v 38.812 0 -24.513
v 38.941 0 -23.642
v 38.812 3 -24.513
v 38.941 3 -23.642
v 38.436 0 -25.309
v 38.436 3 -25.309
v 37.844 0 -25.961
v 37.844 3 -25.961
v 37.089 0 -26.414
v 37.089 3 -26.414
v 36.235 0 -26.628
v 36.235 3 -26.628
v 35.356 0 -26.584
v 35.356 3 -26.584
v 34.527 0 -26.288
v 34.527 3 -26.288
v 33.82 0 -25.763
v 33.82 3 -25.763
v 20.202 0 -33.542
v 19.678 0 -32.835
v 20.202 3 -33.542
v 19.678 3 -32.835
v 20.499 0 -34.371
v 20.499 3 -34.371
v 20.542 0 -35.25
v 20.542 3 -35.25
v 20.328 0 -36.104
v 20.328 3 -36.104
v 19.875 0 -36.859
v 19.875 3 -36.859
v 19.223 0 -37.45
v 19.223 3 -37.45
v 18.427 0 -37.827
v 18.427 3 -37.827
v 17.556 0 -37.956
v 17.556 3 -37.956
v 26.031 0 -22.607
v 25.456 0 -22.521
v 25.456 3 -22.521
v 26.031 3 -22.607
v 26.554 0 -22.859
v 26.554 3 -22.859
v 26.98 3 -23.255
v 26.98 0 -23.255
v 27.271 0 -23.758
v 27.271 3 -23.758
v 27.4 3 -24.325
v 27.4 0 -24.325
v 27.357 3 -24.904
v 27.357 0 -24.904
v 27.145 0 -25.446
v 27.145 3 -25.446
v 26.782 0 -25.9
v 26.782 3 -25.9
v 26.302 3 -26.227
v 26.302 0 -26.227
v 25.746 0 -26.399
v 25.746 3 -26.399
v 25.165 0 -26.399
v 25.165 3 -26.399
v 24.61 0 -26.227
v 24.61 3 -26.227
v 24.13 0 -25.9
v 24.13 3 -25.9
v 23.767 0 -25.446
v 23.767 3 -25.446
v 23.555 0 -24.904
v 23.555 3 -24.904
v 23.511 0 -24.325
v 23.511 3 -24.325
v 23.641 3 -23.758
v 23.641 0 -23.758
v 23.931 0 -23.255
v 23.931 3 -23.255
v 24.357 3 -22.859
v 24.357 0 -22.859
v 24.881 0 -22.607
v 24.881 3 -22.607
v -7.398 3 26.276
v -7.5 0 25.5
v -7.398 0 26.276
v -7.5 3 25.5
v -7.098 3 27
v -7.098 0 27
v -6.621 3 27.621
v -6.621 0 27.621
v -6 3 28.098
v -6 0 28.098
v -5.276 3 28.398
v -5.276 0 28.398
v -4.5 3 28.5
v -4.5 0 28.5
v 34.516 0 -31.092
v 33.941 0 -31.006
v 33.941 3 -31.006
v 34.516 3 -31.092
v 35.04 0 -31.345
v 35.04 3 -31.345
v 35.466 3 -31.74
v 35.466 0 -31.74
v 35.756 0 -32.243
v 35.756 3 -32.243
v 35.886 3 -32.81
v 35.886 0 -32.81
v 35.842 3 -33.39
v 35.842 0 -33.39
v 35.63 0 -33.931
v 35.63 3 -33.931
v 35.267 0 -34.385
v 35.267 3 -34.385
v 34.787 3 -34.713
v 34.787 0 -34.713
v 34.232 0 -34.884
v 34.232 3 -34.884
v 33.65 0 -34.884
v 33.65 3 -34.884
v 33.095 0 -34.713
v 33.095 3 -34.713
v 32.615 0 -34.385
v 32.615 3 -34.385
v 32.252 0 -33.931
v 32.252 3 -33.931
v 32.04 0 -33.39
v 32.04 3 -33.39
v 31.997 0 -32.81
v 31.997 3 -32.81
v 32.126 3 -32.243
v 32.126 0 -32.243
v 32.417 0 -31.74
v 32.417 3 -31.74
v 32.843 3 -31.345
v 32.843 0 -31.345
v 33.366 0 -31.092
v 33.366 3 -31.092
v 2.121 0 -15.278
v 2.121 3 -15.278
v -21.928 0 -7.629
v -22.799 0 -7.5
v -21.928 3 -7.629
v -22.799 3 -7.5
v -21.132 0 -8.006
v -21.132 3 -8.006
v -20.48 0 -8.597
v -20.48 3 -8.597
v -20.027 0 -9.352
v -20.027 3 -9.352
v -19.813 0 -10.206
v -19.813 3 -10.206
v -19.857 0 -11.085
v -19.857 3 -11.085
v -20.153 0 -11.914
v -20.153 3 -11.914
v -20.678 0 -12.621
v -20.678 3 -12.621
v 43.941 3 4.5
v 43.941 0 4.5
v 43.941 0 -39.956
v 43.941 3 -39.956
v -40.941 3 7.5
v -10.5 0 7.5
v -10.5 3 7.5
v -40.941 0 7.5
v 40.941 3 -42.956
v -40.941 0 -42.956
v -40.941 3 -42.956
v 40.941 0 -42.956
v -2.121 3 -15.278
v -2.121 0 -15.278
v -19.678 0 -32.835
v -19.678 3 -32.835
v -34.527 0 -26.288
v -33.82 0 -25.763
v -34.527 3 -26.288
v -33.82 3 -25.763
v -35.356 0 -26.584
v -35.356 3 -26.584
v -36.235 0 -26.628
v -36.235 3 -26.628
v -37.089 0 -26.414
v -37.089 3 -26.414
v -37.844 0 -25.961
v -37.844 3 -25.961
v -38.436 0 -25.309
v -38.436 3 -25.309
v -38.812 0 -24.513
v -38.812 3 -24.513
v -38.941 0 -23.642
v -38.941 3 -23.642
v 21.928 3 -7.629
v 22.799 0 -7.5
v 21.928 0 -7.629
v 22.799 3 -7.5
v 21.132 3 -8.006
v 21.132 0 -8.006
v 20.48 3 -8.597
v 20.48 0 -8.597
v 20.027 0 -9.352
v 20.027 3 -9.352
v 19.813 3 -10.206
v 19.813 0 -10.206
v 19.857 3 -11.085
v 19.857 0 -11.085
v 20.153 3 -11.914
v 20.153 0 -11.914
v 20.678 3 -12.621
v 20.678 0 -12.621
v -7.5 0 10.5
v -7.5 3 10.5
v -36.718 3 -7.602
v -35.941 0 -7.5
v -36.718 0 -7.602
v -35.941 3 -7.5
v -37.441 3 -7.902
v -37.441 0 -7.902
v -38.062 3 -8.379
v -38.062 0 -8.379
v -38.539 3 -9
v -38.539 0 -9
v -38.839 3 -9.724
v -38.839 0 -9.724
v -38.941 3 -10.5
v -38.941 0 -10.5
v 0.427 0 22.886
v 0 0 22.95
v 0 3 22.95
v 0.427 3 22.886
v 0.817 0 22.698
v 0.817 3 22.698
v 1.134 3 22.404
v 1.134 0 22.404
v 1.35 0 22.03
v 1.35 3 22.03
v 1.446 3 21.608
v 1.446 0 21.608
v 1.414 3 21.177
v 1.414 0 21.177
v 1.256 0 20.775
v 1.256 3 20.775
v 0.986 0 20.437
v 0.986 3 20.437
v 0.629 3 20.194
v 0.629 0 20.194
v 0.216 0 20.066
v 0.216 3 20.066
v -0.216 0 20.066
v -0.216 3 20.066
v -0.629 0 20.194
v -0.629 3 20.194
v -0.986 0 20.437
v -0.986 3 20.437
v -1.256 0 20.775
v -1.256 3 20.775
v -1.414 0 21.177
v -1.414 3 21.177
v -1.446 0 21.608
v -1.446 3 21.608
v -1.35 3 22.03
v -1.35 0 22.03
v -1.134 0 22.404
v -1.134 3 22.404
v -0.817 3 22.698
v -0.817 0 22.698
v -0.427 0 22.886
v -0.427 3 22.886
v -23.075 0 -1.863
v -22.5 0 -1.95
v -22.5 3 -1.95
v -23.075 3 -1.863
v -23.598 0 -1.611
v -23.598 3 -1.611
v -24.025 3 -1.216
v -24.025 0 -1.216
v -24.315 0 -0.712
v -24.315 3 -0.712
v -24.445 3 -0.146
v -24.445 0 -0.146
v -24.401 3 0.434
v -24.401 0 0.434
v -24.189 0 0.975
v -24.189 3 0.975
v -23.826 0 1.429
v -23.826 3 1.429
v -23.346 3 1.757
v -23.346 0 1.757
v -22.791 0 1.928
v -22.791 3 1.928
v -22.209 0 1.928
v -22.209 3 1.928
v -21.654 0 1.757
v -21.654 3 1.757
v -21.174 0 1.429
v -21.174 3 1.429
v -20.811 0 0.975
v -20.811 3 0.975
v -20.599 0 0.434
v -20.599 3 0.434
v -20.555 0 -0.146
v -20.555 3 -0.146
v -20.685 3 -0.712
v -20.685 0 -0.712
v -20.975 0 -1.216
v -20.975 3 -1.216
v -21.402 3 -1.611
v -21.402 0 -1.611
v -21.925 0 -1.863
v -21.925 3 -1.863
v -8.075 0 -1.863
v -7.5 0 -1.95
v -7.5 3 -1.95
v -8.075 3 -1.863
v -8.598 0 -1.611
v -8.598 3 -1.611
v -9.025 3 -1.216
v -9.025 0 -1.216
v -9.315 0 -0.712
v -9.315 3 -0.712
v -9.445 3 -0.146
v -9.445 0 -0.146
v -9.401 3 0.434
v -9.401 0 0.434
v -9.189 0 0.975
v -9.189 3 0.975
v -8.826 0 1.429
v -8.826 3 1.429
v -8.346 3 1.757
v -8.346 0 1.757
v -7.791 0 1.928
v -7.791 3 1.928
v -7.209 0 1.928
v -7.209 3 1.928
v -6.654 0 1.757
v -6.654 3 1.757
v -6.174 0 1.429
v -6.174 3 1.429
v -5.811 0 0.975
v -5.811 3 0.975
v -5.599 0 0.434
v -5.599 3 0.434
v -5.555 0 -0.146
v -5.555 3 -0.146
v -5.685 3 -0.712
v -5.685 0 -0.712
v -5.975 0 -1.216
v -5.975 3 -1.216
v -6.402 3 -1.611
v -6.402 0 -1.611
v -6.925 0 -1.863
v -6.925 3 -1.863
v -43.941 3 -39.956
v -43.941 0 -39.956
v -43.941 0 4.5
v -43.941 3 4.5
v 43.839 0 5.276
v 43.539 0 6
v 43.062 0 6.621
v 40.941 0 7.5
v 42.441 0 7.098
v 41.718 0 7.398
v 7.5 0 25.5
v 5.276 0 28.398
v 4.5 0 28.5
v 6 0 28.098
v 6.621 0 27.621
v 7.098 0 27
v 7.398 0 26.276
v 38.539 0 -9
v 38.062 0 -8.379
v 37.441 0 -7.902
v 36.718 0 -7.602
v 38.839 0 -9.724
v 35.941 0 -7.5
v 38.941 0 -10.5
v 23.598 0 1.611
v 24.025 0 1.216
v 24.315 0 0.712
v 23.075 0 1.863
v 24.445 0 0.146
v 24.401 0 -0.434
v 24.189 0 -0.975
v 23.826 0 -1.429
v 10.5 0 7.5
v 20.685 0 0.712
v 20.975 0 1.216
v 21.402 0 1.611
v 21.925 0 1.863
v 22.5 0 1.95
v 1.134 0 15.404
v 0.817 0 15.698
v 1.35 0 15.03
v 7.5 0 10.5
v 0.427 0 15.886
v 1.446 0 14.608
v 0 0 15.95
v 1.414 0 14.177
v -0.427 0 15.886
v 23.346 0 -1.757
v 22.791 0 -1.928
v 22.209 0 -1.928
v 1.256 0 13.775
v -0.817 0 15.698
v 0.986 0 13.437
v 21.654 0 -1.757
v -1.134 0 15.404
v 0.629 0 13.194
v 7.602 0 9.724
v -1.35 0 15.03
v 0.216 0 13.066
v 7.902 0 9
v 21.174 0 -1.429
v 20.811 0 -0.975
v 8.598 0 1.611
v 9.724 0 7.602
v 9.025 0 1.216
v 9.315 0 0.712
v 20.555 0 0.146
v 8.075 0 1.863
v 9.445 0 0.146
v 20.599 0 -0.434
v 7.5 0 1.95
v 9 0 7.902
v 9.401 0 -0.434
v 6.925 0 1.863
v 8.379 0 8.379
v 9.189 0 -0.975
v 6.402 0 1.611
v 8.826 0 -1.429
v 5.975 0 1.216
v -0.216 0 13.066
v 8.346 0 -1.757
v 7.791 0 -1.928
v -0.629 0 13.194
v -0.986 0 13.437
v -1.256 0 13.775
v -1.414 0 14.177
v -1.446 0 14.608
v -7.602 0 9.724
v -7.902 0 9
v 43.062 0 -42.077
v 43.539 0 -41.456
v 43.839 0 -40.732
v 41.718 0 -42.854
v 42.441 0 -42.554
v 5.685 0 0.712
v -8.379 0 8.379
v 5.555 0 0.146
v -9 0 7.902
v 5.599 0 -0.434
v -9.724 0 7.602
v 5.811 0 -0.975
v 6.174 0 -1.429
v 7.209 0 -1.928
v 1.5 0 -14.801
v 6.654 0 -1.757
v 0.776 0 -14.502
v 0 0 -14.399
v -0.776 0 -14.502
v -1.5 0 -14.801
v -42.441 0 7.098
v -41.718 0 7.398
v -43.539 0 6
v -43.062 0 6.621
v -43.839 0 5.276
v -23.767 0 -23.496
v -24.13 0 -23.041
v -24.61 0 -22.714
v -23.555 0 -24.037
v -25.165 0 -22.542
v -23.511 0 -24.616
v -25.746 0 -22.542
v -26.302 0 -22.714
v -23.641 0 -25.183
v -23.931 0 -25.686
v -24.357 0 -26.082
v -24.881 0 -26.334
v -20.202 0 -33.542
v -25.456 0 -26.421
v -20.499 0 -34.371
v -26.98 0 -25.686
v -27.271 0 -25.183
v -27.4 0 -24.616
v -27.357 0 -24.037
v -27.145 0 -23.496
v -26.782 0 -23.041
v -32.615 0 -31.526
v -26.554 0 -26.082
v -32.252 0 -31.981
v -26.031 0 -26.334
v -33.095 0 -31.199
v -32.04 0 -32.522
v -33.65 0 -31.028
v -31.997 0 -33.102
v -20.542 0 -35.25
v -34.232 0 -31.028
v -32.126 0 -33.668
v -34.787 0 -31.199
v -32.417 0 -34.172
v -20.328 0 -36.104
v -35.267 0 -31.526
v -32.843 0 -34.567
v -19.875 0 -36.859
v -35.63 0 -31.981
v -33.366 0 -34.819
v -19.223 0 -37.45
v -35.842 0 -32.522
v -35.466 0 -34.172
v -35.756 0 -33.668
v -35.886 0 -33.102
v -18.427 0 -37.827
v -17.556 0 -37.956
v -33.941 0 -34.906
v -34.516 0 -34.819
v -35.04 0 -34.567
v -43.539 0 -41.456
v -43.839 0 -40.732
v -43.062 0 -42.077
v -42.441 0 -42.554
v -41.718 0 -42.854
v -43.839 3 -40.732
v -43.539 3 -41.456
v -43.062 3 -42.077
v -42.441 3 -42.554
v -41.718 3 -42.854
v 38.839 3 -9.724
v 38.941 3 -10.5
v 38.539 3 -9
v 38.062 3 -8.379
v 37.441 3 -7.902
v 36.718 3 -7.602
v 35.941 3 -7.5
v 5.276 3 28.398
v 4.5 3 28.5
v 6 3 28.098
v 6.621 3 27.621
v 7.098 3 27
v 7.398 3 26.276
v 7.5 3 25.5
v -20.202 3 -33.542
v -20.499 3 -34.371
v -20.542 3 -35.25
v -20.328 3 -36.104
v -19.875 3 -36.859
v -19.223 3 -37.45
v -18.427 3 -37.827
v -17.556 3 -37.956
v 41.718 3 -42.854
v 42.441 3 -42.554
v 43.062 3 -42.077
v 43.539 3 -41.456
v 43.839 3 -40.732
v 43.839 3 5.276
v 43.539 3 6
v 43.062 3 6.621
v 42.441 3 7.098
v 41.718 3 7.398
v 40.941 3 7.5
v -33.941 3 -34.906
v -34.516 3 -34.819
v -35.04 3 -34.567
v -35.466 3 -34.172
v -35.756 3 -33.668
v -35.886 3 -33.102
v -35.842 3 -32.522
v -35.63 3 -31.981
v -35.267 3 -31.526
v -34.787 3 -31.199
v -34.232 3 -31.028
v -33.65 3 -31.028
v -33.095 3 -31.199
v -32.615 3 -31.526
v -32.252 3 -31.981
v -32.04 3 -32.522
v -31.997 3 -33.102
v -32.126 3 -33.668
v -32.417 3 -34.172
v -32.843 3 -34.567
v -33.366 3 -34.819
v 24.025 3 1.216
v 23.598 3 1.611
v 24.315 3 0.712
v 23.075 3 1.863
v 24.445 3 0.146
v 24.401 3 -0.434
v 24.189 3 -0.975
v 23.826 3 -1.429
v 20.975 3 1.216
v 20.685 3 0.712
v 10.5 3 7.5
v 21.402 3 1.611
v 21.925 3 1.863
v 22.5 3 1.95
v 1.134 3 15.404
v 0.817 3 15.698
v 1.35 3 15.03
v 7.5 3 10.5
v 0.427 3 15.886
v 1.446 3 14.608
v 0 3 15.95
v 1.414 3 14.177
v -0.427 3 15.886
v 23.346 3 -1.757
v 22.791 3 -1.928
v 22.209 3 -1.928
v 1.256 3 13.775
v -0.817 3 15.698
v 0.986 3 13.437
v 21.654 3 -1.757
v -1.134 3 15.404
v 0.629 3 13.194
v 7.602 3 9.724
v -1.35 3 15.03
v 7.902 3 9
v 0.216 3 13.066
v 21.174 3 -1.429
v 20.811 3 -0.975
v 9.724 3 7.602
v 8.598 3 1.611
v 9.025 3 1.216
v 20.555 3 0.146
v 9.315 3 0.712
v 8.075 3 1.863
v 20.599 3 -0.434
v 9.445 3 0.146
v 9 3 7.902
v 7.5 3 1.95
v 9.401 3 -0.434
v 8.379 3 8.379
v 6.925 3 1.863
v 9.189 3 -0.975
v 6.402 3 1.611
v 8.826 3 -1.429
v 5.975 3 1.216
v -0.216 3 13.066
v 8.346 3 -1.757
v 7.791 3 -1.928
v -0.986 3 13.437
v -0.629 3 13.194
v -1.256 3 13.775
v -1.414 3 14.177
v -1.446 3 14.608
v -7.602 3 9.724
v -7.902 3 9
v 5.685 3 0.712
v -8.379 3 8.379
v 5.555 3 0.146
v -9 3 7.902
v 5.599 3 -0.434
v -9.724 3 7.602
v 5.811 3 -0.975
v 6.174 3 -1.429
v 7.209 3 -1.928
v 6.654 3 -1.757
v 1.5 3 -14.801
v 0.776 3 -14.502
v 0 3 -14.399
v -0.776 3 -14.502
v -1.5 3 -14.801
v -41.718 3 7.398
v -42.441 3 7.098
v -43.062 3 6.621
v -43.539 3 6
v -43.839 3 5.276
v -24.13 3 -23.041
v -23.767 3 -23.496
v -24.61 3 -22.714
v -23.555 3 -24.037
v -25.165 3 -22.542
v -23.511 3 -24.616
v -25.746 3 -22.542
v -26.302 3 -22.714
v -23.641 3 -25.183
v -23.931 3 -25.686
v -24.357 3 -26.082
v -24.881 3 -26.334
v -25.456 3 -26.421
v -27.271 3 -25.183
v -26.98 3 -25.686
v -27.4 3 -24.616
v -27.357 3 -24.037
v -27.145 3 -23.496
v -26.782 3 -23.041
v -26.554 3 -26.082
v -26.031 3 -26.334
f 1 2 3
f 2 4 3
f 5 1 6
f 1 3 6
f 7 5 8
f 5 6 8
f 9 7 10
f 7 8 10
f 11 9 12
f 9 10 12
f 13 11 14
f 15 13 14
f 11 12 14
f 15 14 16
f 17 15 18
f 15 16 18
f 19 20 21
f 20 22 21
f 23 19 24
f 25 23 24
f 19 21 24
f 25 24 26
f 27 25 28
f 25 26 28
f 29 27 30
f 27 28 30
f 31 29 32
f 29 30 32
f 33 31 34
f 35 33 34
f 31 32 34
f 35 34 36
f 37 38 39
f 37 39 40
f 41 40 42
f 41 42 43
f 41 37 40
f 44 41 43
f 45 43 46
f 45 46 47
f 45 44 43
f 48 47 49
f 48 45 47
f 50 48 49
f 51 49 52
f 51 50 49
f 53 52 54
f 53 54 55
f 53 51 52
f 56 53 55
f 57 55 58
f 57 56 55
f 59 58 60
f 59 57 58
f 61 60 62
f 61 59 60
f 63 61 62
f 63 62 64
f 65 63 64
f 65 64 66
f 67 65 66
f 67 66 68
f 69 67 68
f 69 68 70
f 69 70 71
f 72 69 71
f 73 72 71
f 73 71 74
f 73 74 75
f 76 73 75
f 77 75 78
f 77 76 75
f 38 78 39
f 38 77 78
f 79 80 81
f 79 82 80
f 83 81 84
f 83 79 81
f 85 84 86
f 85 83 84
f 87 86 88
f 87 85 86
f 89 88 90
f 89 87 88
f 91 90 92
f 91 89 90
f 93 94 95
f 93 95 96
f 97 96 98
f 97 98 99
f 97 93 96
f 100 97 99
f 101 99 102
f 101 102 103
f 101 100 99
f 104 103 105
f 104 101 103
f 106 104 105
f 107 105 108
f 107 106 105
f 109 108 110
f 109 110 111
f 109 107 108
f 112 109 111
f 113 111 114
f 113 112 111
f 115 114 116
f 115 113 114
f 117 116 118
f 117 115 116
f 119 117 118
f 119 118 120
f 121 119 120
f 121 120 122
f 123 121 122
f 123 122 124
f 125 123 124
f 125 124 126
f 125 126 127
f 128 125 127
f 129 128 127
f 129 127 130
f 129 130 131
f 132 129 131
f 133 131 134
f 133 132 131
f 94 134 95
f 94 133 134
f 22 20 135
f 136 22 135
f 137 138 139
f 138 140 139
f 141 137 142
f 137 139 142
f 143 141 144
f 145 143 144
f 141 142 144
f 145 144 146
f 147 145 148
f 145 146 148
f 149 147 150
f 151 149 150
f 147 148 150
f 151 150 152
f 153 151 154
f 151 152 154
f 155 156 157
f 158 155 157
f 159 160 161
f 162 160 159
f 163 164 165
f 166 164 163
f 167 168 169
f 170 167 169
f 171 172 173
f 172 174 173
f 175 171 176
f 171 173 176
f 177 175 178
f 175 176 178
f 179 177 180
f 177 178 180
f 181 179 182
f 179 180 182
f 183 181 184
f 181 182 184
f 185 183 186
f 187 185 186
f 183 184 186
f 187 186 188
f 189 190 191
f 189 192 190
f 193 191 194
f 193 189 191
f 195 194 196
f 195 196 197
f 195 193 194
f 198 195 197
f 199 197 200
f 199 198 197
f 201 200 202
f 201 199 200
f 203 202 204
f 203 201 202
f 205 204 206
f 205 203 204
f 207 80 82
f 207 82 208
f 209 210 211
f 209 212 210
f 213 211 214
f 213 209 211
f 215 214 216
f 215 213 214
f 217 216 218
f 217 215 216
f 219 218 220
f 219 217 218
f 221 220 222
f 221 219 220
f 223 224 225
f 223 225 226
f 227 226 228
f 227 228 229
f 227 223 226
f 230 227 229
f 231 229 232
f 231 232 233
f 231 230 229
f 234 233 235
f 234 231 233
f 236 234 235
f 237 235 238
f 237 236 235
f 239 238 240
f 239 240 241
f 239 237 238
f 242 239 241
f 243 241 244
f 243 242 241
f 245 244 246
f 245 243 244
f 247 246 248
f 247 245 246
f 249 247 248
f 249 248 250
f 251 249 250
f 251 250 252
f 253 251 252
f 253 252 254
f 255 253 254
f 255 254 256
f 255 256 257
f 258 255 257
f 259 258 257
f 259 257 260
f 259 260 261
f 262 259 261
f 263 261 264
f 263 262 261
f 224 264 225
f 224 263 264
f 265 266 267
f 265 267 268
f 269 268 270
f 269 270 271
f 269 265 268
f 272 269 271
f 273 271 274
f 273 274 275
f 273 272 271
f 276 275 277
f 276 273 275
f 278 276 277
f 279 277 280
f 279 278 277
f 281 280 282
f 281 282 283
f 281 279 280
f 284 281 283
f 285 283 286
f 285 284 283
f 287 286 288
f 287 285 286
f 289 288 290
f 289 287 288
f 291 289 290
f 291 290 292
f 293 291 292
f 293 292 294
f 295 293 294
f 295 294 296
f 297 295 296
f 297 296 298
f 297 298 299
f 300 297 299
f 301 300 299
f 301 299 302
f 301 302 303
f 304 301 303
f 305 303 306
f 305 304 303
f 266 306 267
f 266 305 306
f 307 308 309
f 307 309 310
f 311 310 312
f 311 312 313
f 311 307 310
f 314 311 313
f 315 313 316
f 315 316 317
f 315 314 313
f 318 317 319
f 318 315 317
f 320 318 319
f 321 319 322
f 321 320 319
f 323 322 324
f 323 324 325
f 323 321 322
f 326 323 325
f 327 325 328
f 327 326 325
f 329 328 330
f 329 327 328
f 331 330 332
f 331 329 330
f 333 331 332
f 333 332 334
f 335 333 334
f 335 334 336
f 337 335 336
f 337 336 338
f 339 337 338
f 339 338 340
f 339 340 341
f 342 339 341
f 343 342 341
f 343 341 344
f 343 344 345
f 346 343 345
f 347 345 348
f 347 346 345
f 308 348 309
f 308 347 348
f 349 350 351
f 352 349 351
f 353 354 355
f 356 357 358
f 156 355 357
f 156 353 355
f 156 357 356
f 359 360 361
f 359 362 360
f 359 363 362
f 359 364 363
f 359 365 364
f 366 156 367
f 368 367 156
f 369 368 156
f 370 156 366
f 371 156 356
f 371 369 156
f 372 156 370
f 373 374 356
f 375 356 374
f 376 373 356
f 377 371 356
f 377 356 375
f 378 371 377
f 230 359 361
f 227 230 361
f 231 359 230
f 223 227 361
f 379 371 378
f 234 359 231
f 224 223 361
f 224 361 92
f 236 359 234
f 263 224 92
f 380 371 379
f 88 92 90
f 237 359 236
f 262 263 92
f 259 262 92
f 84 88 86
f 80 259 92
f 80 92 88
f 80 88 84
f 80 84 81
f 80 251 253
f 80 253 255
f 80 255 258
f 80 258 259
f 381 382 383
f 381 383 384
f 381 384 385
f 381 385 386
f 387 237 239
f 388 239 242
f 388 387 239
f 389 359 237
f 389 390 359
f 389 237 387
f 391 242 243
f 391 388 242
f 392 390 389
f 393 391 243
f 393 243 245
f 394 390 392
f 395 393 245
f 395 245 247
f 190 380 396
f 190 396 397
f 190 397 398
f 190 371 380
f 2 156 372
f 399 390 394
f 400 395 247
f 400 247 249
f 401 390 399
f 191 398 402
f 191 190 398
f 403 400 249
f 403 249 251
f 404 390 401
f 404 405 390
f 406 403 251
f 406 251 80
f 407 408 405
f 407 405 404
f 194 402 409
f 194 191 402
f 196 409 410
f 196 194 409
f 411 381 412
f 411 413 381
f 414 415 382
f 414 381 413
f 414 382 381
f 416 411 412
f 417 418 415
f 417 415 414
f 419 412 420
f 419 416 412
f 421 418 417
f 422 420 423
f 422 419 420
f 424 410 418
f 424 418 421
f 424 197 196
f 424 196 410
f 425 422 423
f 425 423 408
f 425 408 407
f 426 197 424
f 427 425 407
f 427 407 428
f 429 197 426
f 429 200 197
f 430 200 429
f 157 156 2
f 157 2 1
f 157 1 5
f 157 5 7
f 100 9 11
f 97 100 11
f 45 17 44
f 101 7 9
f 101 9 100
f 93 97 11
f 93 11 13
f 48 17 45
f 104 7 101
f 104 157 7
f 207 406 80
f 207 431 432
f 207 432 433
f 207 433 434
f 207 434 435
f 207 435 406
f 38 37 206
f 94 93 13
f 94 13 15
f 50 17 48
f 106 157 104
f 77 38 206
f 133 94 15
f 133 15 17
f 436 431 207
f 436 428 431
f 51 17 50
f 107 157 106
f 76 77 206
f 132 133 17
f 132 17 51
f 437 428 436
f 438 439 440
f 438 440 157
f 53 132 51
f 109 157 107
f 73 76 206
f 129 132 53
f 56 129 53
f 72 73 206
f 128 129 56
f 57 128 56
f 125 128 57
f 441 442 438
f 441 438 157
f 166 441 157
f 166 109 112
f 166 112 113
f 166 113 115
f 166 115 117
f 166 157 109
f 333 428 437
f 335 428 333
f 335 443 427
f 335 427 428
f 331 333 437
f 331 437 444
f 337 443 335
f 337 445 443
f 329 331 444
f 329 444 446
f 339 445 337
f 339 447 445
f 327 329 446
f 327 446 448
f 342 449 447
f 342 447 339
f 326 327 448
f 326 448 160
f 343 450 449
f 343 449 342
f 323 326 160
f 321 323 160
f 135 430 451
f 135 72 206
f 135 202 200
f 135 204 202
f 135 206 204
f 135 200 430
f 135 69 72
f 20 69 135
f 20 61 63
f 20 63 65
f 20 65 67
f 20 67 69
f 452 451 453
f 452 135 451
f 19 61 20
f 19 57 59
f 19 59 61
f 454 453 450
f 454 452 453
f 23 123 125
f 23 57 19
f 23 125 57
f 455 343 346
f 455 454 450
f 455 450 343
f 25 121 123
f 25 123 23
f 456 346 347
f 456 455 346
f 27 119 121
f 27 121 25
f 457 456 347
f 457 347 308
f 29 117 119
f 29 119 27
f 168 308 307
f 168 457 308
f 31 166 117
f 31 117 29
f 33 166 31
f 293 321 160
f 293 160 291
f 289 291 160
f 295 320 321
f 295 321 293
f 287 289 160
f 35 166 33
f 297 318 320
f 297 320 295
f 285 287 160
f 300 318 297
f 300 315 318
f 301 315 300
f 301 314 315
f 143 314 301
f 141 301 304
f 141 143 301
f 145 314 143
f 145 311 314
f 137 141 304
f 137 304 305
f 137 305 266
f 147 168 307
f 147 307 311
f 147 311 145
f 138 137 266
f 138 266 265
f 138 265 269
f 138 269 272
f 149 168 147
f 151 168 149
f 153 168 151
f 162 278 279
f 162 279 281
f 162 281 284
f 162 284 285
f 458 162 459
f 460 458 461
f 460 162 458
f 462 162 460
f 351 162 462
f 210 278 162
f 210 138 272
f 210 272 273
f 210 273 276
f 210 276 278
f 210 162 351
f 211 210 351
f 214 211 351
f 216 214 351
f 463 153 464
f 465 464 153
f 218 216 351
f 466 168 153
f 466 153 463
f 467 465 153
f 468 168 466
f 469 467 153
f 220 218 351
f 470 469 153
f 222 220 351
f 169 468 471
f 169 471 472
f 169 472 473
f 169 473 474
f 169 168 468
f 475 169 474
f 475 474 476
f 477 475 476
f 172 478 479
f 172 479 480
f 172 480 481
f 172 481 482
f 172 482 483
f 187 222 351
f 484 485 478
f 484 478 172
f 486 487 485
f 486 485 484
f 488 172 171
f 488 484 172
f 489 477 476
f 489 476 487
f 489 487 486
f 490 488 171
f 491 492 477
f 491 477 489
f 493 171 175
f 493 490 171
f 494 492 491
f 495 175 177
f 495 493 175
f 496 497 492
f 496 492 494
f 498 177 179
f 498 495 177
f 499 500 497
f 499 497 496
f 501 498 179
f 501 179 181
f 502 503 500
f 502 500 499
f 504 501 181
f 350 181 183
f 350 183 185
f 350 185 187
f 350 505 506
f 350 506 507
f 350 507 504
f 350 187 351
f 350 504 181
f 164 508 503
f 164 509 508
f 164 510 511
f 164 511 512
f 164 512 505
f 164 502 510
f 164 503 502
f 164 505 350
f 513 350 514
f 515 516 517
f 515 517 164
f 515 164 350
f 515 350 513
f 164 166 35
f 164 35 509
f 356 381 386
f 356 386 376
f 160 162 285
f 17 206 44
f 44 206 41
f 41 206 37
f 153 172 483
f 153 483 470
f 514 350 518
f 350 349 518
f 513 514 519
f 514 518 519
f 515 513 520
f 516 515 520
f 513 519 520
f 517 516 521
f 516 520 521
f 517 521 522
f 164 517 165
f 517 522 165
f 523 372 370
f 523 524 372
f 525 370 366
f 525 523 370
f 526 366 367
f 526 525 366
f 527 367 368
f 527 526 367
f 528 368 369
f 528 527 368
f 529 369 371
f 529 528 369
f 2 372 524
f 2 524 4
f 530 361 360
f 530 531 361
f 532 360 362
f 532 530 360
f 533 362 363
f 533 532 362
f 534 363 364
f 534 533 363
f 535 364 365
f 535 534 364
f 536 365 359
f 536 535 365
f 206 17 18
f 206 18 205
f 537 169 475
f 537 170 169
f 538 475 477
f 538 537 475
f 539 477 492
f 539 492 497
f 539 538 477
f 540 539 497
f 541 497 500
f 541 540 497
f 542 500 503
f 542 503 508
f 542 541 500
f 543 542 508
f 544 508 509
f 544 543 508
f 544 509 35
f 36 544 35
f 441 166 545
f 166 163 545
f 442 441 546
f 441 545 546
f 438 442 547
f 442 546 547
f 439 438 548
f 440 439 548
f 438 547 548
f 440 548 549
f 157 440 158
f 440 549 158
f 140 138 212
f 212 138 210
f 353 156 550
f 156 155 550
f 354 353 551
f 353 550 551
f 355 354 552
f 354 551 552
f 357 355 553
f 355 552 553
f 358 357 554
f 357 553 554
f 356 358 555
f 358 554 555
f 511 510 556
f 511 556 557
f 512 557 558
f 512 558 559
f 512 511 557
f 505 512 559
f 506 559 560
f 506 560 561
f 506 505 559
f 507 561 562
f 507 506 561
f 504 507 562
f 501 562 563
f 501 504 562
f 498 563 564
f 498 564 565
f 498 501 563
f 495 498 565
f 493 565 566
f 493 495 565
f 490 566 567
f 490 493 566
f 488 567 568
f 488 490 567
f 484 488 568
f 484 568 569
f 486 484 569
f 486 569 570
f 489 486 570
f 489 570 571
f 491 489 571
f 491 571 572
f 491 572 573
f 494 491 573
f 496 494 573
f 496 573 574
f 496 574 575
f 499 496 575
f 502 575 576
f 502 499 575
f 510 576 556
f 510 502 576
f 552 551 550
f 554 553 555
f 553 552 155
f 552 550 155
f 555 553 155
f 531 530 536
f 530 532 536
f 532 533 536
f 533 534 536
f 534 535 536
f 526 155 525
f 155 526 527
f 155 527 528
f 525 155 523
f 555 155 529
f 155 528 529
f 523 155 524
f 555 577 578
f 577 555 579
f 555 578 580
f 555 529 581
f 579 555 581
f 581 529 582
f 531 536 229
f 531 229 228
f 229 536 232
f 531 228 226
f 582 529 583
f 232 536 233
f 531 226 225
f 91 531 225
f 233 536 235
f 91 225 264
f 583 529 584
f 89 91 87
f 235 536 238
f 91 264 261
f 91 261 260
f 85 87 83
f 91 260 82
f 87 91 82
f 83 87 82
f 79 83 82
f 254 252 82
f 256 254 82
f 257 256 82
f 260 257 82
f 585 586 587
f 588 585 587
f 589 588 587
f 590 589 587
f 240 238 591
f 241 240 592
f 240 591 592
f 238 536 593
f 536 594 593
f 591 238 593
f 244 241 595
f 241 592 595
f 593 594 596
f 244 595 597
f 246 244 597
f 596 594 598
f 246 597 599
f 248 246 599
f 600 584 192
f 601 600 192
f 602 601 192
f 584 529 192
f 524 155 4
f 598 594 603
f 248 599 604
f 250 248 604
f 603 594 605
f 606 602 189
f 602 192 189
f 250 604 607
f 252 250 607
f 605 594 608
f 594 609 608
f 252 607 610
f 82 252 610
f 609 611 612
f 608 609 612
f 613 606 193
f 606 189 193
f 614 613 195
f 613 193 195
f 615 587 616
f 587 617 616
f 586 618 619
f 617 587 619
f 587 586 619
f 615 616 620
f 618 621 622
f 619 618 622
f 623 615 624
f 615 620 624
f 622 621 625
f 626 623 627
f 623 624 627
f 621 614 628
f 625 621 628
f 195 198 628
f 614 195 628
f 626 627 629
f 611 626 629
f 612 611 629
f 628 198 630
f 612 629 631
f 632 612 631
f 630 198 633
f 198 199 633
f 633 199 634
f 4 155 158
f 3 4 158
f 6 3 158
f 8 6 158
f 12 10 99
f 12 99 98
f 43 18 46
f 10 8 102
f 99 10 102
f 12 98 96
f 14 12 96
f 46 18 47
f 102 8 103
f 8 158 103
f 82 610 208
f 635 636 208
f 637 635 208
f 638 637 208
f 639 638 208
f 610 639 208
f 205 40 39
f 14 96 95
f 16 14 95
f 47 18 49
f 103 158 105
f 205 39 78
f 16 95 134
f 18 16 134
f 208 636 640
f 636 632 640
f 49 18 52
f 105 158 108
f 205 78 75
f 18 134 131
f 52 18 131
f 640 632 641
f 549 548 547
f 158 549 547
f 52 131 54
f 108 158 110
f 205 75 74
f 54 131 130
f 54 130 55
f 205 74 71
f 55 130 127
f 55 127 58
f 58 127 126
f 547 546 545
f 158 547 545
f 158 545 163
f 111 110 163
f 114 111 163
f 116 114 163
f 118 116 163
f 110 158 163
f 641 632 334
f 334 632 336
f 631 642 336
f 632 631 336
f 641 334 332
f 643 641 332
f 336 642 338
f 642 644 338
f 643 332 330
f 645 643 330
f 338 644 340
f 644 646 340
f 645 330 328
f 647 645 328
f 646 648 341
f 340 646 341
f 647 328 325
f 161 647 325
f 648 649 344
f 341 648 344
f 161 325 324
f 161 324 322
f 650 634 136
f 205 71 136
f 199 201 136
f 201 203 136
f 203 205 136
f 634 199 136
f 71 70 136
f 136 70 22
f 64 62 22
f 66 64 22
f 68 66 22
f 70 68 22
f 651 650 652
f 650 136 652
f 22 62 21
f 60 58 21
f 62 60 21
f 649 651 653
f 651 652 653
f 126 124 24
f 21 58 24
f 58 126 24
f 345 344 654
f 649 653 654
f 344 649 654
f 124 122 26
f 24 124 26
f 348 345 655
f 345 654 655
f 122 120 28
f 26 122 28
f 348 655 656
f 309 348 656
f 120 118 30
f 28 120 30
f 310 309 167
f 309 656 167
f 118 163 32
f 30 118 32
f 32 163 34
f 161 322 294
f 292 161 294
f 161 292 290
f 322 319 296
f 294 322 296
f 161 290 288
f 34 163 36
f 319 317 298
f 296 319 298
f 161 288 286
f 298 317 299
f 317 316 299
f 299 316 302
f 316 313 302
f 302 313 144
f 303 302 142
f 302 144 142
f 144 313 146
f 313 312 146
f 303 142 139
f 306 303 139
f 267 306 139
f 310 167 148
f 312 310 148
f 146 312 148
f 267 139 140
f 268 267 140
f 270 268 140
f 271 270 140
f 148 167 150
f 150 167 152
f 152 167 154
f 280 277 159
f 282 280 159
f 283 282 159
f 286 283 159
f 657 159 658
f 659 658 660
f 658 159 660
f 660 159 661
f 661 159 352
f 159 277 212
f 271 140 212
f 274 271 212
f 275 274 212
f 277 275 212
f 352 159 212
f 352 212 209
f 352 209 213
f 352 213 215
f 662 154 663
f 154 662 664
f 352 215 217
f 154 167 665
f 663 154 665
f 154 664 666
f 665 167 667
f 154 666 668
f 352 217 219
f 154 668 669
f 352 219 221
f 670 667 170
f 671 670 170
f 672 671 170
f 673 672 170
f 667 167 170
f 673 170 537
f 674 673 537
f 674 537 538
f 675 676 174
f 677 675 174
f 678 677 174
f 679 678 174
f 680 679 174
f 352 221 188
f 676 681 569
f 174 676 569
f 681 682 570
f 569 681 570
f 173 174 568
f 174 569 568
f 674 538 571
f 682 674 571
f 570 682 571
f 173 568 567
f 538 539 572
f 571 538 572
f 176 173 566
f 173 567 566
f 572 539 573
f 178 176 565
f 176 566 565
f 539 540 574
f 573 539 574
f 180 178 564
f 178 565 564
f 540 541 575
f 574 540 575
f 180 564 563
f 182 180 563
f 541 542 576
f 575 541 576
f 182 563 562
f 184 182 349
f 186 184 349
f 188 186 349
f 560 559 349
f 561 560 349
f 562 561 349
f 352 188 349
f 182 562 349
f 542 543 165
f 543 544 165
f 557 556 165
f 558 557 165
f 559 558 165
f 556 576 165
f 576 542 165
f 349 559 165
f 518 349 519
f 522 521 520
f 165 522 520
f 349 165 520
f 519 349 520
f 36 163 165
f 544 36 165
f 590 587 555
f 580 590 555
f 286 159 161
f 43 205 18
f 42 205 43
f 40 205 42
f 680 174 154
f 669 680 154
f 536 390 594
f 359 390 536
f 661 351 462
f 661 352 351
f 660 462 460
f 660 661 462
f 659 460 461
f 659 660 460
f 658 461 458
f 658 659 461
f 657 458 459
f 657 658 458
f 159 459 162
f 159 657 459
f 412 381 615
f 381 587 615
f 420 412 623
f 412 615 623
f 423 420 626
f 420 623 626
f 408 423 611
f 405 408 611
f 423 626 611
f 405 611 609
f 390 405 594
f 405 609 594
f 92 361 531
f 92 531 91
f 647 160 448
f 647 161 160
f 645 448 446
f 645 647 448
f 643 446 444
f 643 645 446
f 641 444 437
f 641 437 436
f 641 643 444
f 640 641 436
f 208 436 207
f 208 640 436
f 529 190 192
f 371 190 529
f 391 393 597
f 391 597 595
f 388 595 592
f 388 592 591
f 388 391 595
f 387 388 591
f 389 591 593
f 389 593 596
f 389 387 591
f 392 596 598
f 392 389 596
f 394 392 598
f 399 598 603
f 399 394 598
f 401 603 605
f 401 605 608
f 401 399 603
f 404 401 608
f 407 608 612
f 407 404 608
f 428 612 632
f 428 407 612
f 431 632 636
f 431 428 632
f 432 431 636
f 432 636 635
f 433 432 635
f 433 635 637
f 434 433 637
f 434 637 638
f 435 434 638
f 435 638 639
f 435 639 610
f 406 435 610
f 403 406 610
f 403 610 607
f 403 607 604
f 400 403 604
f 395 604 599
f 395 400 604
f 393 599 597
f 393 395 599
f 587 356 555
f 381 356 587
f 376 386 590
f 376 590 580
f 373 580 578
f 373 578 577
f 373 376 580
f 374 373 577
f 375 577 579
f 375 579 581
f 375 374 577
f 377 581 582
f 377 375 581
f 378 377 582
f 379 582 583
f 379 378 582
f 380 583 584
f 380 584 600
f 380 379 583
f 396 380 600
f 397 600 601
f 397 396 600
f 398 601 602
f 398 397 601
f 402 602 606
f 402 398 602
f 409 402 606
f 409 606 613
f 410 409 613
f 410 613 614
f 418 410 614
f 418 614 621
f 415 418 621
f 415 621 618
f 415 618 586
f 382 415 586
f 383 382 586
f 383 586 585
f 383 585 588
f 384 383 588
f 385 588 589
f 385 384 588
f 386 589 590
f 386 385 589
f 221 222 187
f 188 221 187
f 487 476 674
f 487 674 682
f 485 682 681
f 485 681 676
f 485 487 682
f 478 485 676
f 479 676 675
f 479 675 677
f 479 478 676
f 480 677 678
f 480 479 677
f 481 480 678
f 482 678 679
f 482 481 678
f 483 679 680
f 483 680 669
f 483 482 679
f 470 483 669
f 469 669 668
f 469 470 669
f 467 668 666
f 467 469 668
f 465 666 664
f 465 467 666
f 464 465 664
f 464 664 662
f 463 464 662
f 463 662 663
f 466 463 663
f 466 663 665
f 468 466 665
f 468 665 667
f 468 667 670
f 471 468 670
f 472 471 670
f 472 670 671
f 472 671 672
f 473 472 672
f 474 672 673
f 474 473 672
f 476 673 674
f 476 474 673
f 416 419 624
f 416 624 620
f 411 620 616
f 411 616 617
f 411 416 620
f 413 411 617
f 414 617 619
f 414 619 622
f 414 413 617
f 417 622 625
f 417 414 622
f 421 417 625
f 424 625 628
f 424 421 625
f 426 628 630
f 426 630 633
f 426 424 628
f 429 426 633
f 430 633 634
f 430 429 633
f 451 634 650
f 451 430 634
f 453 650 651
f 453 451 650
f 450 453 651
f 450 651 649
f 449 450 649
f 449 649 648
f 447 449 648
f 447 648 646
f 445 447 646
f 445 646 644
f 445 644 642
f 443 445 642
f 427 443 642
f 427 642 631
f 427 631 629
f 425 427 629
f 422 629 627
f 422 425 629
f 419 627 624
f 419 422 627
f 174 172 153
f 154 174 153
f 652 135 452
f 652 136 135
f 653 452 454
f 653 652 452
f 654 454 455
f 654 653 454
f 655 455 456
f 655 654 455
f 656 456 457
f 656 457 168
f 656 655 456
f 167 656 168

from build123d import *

# Parameters (mm, degrees)
SKETCH_2_R      = 1.95
SKETCH_2_R_2    = 1.45
EXTRUDE_3_DEPTH = 3
FILLET_2_R      = 3


with BuildPart() as part:
    # 草图2 → 凸台-拉伸3 (new body)
    with BuildSketch(Plane(origin=(0, 0, 0), x_dir=(1, 0, 0), z_dir=(0, 1, 0))):
        Polygon((-43.941125497, -7.5), (-43.941125497, 7.5), (-43.941125497, 42.955844123), (43.941125497, 42.955844123), (43.941125497, 7.5), (43.941125497, -7.5), (7.5, -7.5), (7.5, -28.5), (-7.5, -28.5), (-7.5, -7.5), align=None)
        with Locations(Location((25.455844123, 24.470562748, 0), (0, 0, 270))):
            Circle(SKETCH_2_R, mode=Mode.SUBTRACT)
        with Locations(Location((33.941125497, 32.955844123, 0), (0, 0, 270))):
            Circle(SKETCH_2_R, mode=Mode.SUBTRACT)
        with Locations(Location((7.5, 0, 0), (0, 0, 270))):
            Circle(SKETCH_2_R, mode=Mode.SUBTRACT)
        with Locations(Location((22.5, 0, 0), (0, 0, 270))):
            Circle(SKETCH_2_R, mode=Mode.SUBTRACT)
        with Locations(Location((-33.941125497, 32.955844123, 0), (0, 0, 90))):
            Circle(SKETCH_2_R, mode=Mode.SUBTRACT)
        with Locations(Location((-25.455844123, 24.470562748, 0), (0, 0, 90))):
            Circle(SKETCH_2_R, mode=Mode.SUBTRACT)
        with Locations(Location((-22.5, 0, 0), (0, 0, 90))):
            Circle(SKETCH_2_R, mode=Mode.SUBTRACT)
        with Locations(Location((-7.5, 0, 0), (0, 0, 90))):
            Circle(SKETCH_2_R, mode=Mode.SUBTRACT)
        with Locations(Location((0, -14.5, 0), (0, 0, 270))):
            Circle(SKETCH_2_R_2, mode=Mode.SUBTRACT)
        with Locations(Location((0, -21.5, 0), (0, 0, 270))):
            Circle(SKETCH_2_R_2, mode=Mode.SUBTRACT)
        Polygon((38.941125497, 30.884776311), (15.556349186, 7.5), (38.941125497, 7.5), align=None, mode=Mode.SUBTRACT)
        Polygon((-15.556349186, 7.5), (-38.941125497, 7.5), (-38.941125497, 30.884776311), align=None, mode=Mode.SUBTRACT)
        Polygon((24.798989873, 37.955844123), (0, 13.156854249), (-24.798989873, 37.955844123), align=None, mode=Mode.SUBTRACT)
    extrude(amount=EXTRUDE_3_DEPTH)

    # 圆角2
    fillet_2_edges = [part.edges().sort_by_distance(p)[0] for p in [
        (43.941125497, 1.5, 7.5),
        (7.5, 1.5, 7.5),
        (7.5, 1.5, 28.5),
        (-7.5, 1.5, 28.5),
        (-7.5, 1.5, 7.5),
        (-43.941125497, 1.5, 7.5),
        (-43.941125497, 1.5, -42.955844123),
        (43.941125497, 1.5, -42.955844123),
        (38.941125497, 1.5, -7.5),
        (38.941125497, 1.5, -30.884776311),
        (15.556349186, 1.5, -7.5),
        (-15.556349186, 1.5, -7.5),
        (-38.941125497, 1.5, -30.884776311),
        (-38.941125497, 1.5, -7.5),
        (24.798989873, 1.5, -37.955844123),
        (-24.798989873, 1.5, -37.955844123),
        (0, 1.5, -13.156854249),
    ]]
    fillet(fillet_2_edges, radius=FILLET_2_R)


solid = part.part
